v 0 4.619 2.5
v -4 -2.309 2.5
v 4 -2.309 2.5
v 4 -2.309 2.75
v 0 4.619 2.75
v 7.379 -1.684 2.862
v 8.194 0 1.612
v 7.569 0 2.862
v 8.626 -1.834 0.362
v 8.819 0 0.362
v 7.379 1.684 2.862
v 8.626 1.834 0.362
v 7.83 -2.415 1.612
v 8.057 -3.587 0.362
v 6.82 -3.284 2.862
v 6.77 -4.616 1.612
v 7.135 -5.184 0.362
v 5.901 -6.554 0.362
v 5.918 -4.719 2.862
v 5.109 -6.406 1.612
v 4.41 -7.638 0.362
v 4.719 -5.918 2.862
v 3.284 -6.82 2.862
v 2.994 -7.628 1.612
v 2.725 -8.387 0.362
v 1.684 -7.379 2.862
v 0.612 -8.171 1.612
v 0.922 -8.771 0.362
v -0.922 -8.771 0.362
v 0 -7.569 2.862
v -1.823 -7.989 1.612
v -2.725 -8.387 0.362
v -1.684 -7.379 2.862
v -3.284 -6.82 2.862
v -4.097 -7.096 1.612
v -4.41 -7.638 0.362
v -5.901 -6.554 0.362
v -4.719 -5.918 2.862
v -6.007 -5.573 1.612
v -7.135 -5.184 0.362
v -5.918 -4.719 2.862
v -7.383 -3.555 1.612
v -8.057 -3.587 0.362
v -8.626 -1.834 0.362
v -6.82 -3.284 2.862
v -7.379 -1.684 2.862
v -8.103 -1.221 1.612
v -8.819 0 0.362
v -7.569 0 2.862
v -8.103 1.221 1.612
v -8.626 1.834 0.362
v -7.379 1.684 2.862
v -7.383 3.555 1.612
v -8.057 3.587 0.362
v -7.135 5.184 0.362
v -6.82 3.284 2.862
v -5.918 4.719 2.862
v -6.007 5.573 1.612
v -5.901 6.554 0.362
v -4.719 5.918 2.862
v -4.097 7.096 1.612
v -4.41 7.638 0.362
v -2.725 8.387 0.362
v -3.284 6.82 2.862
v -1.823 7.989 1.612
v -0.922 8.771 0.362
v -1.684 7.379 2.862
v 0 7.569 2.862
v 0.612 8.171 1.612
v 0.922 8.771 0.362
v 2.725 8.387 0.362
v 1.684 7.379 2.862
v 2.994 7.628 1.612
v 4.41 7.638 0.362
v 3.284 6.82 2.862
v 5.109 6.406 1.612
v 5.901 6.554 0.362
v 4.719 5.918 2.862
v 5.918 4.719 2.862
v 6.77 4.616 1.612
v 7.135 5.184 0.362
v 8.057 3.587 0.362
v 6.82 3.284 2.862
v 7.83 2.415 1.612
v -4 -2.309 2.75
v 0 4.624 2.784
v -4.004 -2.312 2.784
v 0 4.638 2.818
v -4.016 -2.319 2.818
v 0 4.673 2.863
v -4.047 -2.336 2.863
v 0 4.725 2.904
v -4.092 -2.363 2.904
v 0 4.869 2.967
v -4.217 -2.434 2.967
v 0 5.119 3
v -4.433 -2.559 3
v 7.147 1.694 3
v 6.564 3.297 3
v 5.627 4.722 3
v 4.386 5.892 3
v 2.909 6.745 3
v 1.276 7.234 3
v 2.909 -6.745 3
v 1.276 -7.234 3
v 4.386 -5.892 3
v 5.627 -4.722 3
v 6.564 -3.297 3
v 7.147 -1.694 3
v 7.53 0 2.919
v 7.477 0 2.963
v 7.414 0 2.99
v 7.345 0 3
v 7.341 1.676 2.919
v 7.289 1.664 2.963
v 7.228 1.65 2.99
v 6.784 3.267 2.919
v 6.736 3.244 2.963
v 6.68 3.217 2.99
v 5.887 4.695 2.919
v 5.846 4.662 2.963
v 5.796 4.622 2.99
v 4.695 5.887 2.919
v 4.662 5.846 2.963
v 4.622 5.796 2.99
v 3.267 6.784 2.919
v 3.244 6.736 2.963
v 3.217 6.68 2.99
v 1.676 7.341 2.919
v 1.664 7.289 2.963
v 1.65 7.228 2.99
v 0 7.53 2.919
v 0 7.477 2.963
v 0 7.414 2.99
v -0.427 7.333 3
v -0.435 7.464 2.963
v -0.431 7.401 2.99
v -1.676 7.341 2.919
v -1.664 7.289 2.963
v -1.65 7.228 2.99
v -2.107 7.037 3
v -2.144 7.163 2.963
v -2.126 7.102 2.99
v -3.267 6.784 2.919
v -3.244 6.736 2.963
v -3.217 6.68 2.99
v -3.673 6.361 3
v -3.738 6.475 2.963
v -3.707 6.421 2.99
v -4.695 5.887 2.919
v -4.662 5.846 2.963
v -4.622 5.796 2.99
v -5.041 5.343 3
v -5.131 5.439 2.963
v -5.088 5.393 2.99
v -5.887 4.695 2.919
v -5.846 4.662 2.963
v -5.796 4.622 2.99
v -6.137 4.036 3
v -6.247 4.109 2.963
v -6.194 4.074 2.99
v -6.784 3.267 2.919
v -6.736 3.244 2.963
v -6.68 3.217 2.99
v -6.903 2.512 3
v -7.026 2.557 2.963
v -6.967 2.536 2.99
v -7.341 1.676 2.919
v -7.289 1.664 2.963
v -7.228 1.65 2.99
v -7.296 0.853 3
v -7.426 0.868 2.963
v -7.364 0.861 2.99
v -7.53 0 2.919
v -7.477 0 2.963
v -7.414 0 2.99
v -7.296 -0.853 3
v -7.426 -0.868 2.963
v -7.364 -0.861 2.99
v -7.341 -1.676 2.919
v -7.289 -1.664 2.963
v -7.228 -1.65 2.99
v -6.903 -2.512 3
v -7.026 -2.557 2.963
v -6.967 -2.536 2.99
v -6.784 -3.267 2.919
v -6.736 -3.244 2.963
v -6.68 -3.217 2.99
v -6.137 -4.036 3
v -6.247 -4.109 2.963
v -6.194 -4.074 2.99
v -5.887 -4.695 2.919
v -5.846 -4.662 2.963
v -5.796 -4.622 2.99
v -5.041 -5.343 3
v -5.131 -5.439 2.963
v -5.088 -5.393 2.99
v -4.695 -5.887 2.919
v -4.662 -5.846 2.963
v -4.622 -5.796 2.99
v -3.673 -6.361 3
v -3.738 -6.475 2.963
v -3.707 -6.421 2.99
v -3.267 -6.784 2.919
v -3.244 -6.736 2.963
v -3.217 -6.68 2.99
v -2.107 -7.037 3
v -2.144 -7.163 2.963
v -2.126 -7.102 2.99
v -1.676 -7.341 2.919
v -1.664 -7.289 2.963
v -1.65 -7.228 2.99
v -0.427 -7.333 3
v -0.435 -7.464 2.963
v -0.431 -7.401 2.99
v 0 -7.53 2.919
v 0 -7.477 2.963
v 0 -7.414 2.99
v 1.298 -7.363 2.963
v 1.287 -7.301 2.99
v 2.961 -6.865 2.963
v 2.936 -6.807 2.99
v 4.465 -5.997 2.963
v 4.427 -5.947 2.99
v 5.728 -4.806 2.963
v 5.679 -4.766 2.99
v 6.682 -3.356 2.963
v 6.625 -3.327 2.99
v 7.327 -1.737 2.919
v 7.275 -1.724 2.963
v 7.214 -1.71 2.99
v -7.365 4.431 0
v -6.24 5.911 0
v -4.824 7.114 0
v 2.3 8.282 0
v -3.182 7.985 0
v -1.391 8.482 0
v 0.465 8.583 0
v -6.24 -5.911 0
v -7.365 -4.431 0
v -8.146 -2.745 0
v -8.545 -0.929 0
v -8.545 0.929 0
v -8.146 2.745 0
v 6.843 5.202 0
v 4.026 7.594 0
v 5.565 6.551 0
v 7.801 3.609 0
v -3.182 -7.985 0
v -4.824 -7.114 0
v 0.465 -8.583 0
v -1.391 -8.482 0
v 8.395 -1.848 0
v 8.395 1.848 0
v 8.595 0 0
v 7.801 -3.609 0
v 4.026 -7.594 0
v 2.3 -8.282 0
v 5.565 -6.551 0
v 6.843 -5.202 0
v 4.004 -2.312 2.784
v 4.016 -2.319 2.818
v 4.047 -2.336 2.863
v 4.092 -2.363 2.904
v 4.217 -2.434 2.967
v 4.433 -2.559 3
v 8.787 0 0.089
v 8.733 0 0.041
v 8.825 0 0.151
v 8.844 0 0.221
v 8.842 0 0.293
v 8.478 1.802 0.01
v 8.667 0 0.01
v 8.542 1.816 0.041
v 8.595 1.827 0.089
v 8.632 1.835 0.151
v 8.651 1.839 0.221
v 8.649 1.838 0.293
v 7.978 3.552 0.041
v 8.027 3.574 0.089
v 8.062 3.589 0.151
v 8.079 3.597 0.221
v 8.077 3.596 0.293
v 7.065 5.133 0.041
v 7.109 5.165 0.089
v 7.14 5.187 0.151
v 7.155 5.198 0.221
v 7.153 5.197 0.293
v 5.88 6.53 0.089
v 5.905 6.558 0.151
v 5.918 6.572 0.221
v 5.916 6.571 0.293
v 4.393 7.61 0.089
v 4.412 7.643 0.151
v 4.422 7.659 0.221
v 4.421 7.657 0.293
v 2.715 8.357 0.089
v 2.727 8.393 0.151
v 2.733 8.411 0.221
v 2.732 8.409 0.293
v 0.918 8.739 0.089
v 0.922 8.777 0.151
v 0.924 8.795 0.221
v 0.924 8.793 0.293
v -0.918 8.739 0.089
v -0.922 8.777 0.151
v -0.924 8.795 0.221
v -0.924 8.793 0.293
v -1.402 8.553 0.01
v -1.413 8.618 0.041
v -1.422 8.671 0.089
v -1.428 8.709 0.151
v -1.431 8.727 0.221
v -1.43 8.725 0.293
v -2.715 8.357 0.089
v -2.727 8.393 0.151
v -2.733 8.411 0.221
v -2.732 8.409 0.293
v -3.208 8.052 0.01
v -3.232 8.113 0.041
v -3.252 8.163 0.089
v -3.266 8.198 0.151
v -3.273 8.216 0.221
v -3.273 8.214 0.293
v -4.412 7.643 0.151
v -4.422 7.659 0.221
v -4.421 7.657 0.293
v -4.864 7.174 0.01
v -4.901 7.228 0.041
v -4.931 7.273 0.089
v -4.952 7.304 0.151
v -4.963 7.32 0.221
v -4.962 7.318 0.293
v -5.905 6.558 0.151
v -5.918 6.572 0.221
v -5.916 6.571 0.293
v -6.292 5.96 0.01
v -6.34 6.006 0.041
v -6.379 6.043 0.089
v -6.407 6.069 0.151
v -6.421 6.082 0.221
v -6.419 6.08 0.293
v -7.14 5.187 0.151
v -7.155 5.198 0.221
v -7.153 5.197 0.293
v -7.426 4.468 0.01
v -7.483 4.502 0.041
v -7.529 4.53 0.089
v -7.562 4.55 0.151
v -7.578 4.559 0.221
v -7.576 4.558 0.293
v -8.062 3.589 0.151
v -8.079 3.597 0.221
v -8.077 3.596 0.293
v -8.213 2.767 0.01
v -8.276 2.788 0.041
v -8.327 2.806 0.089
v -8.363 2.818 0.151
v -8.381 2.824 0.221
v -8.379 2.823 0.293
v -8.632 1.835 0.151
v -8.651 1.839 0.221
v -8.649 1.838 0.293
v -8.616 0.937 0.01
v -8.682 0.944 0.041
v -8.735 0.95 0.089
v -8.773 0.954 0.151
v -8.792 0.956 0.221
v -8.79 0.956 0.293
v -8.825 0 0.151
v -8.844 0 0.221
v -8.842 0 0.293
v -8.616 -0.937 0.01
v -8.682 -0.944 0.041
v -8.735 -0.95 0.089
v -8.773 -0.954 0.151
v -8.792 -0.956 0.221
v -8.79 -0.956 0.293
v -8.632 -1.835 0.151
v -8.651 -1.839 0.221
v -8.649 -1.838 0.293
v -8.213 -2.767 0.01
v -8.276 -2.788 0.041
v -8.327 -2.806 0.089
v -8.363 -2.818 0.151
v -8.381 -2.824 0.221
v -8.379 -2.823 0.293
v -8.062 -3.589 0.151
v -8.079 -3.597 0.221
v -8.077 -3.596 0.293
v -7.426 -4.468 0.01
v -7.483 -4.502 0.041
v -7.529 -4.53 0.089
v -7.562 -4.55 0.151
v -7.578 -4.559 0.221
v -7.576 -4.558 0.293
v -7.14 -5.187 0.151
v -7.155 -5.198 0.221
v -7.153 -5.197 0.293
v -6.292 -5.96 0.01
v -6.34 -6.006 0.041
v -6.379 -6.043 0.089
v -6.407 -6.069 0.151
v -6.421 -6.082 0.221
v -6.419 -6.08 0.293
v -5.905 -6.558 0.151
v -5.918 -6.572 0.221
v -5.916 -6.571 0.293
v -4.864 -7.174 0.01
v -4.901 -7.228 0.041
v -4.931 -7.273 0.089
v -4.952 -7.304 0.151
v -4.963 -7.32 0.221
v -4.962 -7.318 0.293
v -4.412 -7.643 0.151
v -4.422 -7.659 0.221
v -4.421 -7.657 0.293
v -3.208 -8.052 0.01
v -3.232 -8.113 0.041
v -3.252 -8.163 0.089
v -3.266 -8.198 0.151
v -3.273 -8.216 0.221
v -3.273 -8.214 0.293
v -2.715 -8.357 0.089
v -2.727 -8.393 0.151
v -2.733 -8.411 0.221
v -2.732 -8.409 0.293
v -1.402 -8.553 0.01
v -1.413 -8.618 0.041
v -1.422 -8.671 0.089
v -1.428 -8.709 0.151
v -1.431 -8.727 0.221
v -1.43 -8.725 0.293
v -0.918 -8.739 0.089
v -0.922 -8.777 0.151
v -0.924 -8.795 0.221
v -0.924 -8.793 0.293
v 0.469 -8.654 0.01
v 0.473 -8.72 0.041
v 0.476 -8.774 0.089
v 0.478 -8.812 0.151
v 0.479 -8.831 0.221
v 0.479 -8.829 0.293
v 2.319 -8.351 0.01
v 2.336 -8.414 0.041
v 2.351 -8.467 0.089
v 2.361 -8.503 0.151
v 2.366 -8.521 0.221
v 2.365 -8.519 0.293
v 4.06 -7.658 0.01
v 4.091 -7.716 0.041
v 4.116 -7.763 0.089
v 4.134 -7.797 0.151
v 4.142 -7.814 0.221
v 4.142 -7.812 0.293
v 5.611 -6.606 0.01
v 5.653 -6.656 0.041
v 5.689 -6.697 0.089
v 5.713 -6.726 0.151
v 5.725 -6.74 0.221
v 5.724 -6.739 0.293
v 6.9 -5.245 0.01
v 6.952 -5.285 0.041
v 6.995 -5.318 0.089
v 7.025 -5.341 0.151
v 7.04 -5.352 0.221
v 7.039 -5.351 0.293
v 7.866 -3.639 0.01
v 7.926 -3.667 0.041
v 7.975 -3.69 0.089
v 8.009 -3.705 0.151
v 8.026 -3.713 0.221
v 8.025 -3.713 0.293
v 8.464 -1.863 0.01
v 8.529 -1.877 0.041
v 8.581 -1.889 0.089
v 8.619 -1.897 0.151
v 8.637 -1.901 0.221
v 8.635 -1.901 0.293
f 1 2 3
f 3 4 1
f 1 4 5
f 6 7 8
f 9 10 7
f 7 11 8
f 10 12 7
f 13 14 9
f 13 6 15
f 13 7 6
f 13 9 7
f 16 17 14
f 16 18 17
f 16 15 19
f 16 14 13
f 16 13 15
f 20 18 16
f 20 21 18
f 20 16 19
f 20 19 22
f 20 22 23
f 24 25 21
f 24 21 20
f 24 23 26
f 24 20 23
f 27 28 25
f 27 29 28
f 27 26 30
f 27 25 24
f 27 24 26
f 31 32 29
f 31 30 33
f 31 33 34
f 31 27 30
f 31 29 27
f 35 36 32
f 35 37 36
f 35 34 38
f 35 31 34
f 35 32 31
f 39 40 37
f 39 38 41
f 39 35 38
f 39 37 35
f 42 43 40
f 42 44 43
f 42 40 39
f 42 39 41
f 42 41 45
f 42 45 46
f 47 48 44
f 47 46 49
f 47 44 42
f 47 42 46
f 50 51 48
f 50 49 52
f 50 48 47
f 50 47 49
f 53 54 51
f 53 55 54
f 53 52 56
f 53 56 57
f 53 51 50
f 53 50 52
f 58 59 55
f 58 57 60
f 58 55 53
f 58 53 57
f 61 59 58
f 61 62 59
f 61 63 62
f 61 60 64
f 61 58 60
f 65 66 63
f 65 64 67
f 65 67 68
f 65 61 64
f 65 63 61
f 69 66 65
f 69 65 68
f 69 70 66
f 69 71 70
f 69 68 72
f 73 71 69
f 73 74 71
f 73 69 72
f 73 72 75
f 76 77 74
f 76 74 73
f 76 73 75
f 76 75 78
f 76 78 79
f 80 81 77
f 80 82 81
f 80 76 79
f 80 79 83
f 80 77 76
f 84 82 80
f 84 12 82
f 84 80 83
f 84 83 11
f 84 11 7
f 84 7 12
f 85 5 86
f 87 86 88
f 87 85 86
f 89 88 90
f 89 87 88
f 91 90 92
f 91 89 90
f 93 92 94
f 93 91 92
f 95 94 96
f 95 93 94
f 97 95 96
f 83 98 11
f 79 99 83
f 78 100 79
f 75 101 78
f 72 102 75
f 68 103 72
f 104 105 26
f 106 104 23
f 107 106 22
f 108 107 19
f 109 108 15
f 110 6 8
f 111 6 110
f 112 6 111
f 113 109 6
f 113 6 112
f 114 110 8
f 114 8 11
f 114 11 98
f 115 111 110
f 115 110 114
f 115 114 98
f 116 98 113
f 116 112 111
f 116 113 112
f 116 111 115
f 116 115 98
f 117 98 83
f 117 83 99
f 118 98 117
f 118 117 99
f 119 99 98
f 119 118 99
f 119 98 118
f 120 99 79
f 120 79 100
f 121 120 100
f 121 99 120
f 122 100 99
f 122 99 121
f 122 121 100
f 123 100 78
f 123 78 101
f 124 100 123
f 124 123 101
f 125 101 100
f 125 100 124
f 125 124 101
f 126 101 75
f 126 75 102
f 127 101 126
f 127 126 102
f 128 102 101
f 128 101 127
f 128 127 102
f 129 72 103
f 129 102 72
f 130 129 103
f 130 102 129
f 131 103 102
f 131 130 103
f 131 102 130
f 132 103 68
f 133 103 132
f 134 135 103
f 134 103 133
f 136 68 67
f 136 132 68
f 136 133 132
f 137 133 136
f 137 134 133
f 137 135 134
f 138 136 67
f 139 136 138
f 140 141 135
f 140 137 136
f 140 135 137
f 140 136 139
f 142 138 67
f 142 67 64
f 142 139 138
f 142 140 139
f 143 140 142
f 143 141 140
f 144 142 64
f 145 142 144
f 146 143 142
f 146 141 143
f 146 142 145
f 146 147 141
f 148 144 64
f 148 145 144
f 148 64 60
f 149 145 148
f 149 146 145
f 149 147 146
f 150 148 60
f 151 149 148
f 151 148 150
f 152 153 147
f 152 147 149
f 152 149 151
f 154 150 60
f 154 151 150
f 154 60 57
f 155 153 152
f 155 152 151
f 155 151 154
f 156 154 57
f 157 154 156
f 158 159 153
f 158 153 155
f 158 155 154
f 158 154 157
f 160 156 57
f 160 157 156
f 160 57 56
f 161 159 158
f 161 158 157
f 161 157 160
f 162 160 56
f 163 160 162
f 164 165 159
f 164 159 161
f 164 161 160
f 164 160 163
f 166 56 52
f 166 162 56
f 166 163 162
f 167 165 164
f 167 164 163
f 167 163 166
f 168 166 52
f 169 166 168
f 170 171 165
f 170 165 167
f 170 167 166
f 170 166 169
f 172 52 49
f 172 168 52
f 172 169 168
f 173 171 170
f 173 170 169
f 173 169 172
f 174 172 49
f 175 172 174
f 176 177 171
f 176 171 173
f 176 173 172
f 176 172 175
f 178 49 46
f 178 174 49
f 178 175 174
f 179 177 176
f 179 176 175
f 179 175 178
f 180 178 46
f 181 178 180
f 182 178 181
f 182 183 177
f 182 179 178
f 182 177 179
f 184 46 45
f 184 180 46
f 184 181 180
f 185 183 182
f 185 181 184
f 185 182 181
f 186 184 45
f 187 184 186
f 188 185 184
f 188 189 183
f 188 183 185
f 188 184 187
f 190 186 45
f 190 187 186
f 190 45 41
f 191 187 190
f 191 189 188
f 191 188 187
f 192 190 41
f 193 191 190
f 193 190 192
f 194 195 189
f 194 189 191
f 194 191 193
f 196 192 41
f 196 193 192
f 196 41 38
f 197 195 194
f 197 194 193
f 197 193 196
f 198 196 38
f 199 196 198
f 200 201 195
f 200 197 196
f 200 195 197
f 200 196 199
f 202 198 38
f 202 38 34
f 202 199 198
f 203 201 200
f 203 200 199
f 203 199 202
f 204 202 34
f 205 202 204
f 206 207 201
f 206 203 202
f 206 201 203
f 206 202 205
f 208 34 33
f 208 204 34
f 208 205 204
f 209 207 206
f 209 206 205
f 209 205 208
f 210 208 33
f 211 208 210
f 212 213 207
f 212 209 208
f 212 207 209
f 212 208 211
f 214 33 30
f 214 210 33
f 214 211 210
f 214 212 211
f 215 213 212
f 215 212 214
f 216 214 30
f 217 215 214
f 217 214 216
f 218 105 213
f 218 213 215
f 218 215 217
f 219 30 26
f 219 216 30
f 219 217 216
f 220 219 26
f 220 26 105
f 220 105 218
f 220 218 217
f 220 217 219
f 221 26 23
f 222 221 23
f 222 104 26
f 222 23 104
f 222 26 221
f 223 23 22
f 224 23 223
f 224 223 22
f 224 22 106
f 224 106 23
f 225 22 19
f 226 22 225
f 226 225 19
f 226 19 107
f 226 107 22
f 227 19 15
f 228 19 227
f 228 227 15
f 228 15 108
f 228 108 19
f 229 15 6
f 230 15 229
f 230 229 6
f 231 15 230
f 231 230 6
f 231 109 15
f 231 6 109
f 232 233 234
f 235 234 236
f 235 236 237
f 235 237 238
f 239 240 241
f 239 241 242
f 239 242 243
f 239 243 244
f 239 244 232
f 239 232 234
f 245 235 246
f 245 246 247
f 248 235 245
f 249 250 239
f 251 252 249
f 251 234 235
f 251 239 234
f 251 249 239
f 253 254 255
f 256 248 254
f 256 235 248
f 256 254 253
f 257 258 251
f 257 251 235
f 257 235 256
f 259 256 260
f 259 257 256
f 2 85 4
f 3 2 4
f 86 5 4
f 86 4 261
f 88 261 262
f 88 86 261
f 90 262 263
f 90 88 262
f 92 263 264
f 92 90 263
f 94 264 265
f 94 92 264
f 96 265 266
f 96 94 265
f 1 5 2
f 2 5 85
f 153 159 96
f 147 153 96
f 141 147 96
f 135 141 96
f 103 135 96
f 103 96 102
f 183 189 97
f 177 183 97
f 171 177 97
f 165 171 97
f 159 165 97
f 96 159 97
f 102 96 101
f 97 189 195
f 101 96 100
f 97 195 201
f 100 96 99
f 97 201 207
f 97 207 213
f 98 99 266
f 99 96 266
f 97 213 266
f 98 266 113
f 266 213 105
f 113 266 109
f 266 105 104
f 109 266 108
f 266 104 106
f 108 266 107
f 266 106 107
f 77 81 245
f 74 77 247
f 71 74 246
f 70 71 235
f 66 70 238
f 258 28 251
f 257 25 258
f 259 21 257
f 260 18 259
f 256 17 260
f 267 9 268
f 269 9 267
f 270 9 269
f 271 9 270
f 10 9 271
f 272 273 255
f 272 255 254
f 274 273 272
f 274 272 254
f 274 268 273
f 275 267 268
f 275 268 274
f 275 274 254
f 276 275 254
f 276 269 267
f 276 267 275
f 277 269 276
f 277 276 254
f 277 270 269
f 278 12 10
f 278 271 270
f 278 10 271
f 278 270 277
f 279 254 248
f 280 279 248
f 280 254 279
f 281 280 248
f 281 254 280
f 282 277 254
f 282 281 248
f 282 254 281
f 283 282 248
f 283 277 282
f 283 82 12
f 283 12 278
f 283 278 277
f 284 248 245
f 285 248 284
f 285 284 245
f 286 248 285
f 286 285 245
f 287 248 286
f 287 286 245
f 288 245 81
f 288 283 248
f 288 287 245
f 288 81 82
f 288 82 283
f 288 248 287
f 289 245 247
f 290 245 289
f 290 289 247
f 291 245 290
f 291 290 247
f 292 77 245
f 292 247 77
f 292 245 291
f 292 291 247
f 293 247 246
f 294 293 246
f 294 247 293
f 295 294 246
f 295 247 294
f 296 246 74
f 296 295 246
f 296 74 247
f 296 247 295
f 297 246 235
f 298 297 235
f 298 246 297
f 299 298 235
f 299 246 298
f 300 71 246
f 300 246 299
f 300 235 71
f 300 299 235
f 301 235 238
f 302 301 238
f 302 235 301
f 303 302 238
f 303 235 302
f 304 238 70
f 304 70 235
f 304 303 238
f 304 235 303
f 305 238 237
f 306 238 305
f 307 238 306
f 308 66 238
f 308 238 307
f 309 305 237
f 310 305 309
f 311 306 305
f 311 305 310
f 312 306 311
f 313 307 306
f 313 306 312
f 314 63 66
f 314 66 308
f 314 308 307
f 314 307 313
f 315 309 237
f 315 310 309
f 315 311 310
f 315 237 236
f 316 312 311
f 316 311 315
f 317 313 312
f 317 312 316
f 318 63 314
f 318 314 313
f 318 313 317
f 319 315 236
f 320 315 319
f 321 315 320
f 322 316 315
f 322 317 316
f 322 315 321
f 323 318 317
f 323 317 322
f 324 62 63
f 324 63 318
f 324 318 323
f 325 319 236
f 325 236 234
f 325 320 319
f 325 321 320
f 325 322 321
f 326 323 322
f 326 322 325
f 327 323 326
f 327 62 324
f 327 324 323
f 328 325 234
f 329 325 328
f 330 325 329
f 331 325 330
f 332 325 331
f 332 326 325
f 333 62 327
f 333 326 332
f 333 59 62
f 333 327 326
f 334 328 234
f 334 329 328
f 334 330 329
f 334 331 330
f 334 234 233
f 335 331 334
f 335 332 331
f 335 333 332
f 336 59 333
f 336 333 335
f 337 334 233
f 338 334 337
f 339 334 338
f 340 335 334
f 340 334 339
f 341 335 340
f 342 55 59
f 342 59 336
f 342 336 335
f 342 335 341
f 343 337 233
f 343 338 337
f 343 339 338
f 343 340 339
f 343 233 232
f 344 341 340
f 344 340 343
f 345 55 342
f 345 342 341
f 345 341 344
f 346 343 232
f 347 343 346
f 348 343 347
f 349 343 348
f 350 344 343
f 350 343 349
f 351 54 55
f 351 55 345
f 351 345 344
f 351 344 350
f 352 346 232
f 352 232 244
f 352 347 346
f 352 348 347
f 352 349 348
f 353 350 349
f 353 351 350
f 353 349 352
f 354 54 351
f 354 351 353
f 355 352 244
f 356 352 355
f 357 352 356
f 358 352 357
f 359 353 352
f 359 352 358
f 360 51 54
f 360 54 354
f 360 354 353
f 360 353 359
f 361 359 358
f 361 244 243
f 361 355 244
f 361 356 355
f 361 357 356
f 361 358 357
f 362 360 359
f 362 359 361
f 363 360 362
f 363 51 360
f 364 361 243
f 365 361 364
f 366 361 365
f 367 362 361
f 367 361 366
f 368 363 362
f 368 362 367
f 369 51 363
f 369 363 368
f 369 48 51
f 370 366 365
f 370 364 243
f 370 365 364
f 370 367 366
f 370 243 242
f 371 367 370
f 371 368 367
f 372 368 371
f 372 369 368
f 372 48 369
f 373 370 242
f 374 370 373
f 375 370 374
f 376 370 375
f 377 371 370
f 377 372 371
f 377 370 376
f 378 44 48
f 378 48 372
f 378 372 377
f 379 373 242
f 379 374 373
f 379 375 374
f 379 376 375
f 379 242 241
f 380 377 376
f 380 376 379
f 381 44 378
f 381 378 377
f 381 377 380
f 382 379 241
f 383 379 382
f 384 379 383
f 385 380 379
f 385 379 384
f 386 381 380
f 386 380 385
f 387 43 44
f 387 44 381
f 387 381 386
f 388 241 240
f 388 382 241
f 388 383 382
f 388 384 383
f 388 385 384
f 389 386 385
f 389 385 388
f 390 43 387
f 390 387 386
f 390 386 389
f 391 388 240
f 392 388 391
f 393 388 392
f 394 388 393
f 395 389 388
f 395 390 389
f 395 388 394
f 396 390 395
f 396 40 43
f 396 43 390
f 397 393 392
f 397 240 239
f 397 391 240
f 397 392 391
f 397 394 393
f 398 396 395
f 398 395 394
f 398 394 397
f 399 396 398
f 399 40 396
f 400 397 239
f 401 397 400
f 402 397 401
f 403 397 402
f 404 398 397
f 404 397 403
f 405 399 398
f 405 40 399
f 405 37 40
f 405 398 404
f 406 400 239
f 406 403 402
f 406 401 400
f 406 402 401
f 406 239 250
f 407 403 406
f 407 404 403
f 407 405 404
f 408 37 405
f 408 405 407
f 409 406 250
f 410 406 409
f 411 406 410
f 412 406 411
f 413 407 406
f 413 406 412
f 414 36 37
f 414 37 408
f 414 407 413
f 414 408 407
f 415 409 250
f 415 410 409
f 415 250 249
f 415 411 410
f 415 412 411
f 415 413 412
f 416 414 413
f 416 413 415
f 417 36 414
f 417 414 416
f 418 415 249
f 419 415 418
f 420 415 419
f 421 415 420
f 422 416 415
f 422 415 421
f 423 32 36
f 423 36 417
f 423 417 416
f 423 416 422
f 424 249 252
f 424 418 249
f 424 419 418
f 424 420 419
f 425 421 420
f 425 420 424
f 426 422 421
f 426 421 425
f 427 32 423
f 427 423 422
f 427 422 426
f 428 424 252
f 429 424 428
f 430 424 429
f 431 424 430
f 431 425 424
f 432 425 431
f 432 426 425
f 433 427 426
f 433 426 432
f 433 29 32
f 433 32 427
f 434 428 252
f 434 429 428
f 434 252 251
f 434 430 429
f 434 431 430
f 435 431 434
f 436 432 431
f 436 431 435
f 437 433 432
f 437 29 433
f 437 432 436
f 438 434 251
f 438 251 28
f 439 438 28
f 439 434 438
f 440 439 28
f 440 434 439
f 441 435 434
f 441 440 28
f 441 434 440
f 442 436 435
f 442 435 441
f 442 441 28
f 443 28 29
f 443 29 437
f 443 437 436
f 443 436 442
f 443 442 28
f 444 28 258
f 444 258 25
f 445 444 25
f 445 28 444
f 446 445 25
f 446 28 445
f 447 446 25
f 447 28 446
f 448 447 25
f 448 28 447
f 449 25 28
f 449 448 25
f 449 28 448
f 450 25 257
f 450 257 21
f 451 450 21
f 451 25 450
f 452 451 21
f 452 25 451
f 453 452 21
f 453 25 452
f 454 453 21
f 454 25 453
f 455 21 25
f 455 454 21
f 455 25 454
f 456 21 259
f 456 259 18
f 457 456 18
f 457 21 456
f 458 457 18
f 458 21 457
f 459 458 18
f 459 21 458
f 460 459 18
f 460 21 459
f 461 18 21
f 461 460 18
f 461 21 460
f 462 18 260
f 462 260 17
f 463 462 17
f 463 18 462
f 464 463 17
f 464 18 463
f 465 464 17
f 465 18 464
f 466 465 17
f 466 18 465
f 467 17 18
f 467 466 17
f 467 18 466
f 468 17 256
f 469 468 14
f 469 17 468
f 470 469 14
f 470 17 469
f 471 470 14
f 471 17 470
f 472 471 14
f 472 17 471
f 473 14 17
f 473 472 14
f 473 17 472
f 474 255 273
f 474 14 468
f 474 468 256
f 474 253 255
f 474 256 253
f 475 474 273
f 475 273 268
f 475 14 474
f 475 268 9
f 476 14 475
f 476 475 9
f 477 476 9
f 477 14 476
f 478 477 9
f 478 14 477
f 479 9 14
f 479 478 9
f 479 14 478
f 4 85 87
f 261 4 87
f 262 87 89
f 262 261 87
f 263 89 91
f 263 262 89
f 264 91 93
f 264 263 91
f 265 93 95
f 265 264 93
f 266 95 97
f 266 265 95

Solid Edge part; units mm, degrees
sketch "Sketch1" plane through (0, 0, 0) normal (0, -1, 0) x (1, 0, 0)
  line L0 (0, 0) -> (9, 0)
  line L1 (9, 0) -> (7.5, 3)
  line L2 (7.5, 3) -> (0, 3)
  dimension "D1" = 9
  dimension "D2" = 3
  dimension "D3" = 7.5
revolve "RevolvedProtrusion1" add sketch "Sketch1" angle 360 about axis through (0, 0, 3) along (0, 0, -1)
sketch "Sketch2" plane through (0, 0, 3) normal (0, 0, 1) x (1, 0, 0)
  line L0 (0, 4.6188) -> (-4, -2.3094)
  line L1 (-4, -2.3094) -> (4, -2.3094)
  line L2 (4, -2.3094) -> (0, 4.6188)
  dimension "D1" = 8
extrude "triangle_cut" cut sketch "Sketch2" against normal blind 0.5
fillet "Round1" radius 0.25 5 edges at (-9, 0, 0) (-7.5, 0, 3) (-2, 1.1547, 3) (2, 1.1547, 3) (0, -2.3094, 3)
properties material "Polyethylene, low density"
